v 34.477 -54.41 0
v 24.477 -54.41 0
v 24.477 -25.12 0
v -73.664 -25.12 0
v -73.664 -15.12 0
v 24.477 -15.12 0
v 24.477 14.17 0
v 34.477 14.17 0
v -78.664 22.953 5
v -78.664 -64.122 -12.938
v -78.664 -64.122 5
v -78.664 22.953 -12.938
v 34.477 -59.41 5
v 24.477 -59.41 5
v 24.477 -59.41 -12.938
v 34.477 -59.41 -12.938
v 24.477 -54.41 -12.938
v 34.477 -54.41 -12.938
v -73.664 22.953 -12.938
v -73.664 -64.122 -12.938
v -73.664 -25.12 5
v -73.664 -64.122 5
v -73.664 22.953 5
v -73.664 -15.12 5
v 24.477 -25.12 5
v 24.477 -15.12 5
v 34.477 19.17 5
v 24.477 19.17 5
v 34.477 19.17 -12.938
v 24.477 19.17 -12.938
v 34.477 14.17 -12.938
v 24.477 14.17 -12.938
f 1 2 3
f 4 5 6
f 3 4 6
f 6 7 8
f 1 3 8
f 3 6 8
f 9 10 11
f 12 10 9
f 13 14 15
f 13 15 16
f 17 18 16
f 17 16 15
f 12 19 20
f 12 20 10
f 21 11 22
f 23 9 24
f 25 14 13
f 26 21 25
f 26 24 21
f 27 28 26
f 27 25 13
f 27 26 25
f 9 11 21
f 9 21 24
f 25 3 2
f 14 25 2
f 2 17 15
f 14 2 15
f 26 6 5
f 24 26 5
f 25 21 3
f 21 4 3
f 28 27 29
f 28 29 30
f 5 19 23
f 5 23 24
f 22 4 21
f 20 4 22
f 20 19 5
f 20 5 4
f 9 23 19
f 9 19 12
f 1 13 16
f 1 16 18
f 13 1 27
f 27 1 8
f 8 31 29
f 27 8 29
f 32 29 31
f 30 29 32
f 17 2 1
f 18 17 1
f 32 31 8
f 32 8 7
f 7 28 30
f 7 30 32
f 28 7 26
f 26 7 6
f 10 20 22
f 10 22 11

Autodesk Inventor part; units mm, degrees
ref_plane "YZ Plane" through (0, 0, 0) normal (1, 0, 0) x (0, 1, 0)
ref_plane "XZ Plane" through (0, 0, 0) normal (0, 1, 0) x (-1, 0, 0)
ref_plane "XY Plane" through (0, 0, 0) normal (0, 0, 1) x (1, 0, 0)
sketch "Sketch1" plane through (0, 0, 0) normal (0, 0, 1) x (1, 0, 0)
  point P0 (0, 0)
sketch "Sketch2" plane through (0, 0, 0) normal (0, 0, 1) x (1, 0, 0)
  line L0 (76.1957, 14.1695) -> (-73.6643, 14.1695) construction
  line L1 (-73.6643, -54.4105) -> (76.1957, -54.4105) construction
  line L2 (34.477, 19.1695) -> (24.477, 19.1695)
  line L3 (24.477, -59.4105) -> (34.477, -59.4105)
  line L4 (34.477, -59.4105) -> (34.477, 19.1695)
  line L5 (24.477, -15.1205) -> (-78.6643, -15.1205)
  line L6 (-78.6643, -15.1205) -> (-78.6643, -25.1205)
  line L7 (-78.6643, -25.1205) -> (24.477, -25.1205)
  line L8 (-73.6643, 14.1695) -> (-73.6643, -54.4105) construction
  line L9 (76.1957, -54.4105) -> (76.1957, 14.1695) construction
  line L10 (76.1957, -20.1205) -> (-73.6643, -20.1205) construction
  line L11 (24.477, 19.1695) -> (24.477, -15.1205)
  line L12 (24.477, -25.1205) -> (24.477, -59.4105)
  line L13 (44.477, -30.2805) -> (44.477, -9.9605) construction
  line L14 (57.177, -30.2805) -> (44.477, -30.2805) construction
  line L15 (57.177, -9.9605) -> (57.177, -30.2805) construction
  line L16 (44.477, -9.9605) -> (57.177, -9.9605) construction
  point P0 (0, 0)
  point P1 (-78.6643, -20.1205)
  dimension "d0" = 5
  dimension "d1" = 5
  dimension "d2" = 5
  dimension "d3" = 10
  dimension "d5" = 10
  dimension "d6" = 10
extrude "Extrusion1" add sketch "Sketch2" along normal blind 5
sketch "Sketch3" plane through (0, 0, 0) normal (0, 0, -1) x (-1, 0, 0)
  line L0 (-76.1957, 14.1695) -> (73.6643, 14.1695) projected
  line L1 (-76.1957, -54.4105) -> (-76.1957, 14.1695) projected
  line L2 (73.6643, -54.4105) -> (-76.1957, -54.4105) projected
  line L3 (73.6643, 14.1695) -> (73.6643, -54.4105) projected
  line L4 (-34.477, -59.4105) -> (-34.477, 19.1695) projected
  line L5 (-24.477, 19.1695) -> (-24.477, -15.1205) projected
  line L6 (-34.477, 19.1695) -> (-24.477, 19.1695)
  line L7 (-24.477, 19.1695) -> (-24.477, 14.1695)
  line L8 (-24.477, 14.1695) -> (-34.477, 14.1695)
  line L9 (-34.477, 14.1695) -> (-34.477, 19.1695)
  line L10 (-24.477, -25.1205) -> (-24.477, -59.4105) projected
  line L11 (-24.477, -59.4105) -> (-34.477, -59.4105)
  line L12 (-34.477, -59.4105) -> (-34.477, -54.4105)
  line L13 (-34.477, -54.4105) -> (-24.477, -54.4105)
  line L14 (-24.477, -54.4105) -> (-24.477, -59.4105)
  line L15 (73.6643, 22.9533) -> (78.6643, 22.9533)
  line L16 (78.6643, 22.9533) -> (78.6643, -64.1223)
  line L17 (78.6643, -64.1223) -> (73.6643, -64.1223)
  line L18 (73.6643, -64.1223) -> (73.6643, 22.9533)
  point P0 (0, 0)
  point P1 (-24.477, -54.4105)
  point P2 (-34.477, -54.4105)
  point P3 (-34.477, 14.1695)
extrude "Extrusion2" add sketch "Sketch3" along normal blind 12.9375 contours L4 L6 L5 L0 | L2 L10 L11 L4 | L18 L15 L16 L17 L3
sketch "Sketch4" plane through (0, 0, 0) normal (0, 0, 1) x (1, 0, 0)
  line L0 (-78.6643, -64.1223) -> (-78.6643, 22.9533) projected
  line L1 (-78.6643, 22.9533) -> (-73.6643, 22.9533)
  line L2 (-73.6643, 22.9533) -> (-73.6643, -64.1223)
  line L3 (-73.6643, -64.1223) -> (-78.6643, -64.1223)
  line L4 (-78.6643, -64.1223) -> (-78.6643, 22.9533)
  point P0 (0, 0)
extrude "Extrusion3" add sketch "Sketch4" along normal blind 5
equation "\"d5\" = d3"
properties part number "Holder"
